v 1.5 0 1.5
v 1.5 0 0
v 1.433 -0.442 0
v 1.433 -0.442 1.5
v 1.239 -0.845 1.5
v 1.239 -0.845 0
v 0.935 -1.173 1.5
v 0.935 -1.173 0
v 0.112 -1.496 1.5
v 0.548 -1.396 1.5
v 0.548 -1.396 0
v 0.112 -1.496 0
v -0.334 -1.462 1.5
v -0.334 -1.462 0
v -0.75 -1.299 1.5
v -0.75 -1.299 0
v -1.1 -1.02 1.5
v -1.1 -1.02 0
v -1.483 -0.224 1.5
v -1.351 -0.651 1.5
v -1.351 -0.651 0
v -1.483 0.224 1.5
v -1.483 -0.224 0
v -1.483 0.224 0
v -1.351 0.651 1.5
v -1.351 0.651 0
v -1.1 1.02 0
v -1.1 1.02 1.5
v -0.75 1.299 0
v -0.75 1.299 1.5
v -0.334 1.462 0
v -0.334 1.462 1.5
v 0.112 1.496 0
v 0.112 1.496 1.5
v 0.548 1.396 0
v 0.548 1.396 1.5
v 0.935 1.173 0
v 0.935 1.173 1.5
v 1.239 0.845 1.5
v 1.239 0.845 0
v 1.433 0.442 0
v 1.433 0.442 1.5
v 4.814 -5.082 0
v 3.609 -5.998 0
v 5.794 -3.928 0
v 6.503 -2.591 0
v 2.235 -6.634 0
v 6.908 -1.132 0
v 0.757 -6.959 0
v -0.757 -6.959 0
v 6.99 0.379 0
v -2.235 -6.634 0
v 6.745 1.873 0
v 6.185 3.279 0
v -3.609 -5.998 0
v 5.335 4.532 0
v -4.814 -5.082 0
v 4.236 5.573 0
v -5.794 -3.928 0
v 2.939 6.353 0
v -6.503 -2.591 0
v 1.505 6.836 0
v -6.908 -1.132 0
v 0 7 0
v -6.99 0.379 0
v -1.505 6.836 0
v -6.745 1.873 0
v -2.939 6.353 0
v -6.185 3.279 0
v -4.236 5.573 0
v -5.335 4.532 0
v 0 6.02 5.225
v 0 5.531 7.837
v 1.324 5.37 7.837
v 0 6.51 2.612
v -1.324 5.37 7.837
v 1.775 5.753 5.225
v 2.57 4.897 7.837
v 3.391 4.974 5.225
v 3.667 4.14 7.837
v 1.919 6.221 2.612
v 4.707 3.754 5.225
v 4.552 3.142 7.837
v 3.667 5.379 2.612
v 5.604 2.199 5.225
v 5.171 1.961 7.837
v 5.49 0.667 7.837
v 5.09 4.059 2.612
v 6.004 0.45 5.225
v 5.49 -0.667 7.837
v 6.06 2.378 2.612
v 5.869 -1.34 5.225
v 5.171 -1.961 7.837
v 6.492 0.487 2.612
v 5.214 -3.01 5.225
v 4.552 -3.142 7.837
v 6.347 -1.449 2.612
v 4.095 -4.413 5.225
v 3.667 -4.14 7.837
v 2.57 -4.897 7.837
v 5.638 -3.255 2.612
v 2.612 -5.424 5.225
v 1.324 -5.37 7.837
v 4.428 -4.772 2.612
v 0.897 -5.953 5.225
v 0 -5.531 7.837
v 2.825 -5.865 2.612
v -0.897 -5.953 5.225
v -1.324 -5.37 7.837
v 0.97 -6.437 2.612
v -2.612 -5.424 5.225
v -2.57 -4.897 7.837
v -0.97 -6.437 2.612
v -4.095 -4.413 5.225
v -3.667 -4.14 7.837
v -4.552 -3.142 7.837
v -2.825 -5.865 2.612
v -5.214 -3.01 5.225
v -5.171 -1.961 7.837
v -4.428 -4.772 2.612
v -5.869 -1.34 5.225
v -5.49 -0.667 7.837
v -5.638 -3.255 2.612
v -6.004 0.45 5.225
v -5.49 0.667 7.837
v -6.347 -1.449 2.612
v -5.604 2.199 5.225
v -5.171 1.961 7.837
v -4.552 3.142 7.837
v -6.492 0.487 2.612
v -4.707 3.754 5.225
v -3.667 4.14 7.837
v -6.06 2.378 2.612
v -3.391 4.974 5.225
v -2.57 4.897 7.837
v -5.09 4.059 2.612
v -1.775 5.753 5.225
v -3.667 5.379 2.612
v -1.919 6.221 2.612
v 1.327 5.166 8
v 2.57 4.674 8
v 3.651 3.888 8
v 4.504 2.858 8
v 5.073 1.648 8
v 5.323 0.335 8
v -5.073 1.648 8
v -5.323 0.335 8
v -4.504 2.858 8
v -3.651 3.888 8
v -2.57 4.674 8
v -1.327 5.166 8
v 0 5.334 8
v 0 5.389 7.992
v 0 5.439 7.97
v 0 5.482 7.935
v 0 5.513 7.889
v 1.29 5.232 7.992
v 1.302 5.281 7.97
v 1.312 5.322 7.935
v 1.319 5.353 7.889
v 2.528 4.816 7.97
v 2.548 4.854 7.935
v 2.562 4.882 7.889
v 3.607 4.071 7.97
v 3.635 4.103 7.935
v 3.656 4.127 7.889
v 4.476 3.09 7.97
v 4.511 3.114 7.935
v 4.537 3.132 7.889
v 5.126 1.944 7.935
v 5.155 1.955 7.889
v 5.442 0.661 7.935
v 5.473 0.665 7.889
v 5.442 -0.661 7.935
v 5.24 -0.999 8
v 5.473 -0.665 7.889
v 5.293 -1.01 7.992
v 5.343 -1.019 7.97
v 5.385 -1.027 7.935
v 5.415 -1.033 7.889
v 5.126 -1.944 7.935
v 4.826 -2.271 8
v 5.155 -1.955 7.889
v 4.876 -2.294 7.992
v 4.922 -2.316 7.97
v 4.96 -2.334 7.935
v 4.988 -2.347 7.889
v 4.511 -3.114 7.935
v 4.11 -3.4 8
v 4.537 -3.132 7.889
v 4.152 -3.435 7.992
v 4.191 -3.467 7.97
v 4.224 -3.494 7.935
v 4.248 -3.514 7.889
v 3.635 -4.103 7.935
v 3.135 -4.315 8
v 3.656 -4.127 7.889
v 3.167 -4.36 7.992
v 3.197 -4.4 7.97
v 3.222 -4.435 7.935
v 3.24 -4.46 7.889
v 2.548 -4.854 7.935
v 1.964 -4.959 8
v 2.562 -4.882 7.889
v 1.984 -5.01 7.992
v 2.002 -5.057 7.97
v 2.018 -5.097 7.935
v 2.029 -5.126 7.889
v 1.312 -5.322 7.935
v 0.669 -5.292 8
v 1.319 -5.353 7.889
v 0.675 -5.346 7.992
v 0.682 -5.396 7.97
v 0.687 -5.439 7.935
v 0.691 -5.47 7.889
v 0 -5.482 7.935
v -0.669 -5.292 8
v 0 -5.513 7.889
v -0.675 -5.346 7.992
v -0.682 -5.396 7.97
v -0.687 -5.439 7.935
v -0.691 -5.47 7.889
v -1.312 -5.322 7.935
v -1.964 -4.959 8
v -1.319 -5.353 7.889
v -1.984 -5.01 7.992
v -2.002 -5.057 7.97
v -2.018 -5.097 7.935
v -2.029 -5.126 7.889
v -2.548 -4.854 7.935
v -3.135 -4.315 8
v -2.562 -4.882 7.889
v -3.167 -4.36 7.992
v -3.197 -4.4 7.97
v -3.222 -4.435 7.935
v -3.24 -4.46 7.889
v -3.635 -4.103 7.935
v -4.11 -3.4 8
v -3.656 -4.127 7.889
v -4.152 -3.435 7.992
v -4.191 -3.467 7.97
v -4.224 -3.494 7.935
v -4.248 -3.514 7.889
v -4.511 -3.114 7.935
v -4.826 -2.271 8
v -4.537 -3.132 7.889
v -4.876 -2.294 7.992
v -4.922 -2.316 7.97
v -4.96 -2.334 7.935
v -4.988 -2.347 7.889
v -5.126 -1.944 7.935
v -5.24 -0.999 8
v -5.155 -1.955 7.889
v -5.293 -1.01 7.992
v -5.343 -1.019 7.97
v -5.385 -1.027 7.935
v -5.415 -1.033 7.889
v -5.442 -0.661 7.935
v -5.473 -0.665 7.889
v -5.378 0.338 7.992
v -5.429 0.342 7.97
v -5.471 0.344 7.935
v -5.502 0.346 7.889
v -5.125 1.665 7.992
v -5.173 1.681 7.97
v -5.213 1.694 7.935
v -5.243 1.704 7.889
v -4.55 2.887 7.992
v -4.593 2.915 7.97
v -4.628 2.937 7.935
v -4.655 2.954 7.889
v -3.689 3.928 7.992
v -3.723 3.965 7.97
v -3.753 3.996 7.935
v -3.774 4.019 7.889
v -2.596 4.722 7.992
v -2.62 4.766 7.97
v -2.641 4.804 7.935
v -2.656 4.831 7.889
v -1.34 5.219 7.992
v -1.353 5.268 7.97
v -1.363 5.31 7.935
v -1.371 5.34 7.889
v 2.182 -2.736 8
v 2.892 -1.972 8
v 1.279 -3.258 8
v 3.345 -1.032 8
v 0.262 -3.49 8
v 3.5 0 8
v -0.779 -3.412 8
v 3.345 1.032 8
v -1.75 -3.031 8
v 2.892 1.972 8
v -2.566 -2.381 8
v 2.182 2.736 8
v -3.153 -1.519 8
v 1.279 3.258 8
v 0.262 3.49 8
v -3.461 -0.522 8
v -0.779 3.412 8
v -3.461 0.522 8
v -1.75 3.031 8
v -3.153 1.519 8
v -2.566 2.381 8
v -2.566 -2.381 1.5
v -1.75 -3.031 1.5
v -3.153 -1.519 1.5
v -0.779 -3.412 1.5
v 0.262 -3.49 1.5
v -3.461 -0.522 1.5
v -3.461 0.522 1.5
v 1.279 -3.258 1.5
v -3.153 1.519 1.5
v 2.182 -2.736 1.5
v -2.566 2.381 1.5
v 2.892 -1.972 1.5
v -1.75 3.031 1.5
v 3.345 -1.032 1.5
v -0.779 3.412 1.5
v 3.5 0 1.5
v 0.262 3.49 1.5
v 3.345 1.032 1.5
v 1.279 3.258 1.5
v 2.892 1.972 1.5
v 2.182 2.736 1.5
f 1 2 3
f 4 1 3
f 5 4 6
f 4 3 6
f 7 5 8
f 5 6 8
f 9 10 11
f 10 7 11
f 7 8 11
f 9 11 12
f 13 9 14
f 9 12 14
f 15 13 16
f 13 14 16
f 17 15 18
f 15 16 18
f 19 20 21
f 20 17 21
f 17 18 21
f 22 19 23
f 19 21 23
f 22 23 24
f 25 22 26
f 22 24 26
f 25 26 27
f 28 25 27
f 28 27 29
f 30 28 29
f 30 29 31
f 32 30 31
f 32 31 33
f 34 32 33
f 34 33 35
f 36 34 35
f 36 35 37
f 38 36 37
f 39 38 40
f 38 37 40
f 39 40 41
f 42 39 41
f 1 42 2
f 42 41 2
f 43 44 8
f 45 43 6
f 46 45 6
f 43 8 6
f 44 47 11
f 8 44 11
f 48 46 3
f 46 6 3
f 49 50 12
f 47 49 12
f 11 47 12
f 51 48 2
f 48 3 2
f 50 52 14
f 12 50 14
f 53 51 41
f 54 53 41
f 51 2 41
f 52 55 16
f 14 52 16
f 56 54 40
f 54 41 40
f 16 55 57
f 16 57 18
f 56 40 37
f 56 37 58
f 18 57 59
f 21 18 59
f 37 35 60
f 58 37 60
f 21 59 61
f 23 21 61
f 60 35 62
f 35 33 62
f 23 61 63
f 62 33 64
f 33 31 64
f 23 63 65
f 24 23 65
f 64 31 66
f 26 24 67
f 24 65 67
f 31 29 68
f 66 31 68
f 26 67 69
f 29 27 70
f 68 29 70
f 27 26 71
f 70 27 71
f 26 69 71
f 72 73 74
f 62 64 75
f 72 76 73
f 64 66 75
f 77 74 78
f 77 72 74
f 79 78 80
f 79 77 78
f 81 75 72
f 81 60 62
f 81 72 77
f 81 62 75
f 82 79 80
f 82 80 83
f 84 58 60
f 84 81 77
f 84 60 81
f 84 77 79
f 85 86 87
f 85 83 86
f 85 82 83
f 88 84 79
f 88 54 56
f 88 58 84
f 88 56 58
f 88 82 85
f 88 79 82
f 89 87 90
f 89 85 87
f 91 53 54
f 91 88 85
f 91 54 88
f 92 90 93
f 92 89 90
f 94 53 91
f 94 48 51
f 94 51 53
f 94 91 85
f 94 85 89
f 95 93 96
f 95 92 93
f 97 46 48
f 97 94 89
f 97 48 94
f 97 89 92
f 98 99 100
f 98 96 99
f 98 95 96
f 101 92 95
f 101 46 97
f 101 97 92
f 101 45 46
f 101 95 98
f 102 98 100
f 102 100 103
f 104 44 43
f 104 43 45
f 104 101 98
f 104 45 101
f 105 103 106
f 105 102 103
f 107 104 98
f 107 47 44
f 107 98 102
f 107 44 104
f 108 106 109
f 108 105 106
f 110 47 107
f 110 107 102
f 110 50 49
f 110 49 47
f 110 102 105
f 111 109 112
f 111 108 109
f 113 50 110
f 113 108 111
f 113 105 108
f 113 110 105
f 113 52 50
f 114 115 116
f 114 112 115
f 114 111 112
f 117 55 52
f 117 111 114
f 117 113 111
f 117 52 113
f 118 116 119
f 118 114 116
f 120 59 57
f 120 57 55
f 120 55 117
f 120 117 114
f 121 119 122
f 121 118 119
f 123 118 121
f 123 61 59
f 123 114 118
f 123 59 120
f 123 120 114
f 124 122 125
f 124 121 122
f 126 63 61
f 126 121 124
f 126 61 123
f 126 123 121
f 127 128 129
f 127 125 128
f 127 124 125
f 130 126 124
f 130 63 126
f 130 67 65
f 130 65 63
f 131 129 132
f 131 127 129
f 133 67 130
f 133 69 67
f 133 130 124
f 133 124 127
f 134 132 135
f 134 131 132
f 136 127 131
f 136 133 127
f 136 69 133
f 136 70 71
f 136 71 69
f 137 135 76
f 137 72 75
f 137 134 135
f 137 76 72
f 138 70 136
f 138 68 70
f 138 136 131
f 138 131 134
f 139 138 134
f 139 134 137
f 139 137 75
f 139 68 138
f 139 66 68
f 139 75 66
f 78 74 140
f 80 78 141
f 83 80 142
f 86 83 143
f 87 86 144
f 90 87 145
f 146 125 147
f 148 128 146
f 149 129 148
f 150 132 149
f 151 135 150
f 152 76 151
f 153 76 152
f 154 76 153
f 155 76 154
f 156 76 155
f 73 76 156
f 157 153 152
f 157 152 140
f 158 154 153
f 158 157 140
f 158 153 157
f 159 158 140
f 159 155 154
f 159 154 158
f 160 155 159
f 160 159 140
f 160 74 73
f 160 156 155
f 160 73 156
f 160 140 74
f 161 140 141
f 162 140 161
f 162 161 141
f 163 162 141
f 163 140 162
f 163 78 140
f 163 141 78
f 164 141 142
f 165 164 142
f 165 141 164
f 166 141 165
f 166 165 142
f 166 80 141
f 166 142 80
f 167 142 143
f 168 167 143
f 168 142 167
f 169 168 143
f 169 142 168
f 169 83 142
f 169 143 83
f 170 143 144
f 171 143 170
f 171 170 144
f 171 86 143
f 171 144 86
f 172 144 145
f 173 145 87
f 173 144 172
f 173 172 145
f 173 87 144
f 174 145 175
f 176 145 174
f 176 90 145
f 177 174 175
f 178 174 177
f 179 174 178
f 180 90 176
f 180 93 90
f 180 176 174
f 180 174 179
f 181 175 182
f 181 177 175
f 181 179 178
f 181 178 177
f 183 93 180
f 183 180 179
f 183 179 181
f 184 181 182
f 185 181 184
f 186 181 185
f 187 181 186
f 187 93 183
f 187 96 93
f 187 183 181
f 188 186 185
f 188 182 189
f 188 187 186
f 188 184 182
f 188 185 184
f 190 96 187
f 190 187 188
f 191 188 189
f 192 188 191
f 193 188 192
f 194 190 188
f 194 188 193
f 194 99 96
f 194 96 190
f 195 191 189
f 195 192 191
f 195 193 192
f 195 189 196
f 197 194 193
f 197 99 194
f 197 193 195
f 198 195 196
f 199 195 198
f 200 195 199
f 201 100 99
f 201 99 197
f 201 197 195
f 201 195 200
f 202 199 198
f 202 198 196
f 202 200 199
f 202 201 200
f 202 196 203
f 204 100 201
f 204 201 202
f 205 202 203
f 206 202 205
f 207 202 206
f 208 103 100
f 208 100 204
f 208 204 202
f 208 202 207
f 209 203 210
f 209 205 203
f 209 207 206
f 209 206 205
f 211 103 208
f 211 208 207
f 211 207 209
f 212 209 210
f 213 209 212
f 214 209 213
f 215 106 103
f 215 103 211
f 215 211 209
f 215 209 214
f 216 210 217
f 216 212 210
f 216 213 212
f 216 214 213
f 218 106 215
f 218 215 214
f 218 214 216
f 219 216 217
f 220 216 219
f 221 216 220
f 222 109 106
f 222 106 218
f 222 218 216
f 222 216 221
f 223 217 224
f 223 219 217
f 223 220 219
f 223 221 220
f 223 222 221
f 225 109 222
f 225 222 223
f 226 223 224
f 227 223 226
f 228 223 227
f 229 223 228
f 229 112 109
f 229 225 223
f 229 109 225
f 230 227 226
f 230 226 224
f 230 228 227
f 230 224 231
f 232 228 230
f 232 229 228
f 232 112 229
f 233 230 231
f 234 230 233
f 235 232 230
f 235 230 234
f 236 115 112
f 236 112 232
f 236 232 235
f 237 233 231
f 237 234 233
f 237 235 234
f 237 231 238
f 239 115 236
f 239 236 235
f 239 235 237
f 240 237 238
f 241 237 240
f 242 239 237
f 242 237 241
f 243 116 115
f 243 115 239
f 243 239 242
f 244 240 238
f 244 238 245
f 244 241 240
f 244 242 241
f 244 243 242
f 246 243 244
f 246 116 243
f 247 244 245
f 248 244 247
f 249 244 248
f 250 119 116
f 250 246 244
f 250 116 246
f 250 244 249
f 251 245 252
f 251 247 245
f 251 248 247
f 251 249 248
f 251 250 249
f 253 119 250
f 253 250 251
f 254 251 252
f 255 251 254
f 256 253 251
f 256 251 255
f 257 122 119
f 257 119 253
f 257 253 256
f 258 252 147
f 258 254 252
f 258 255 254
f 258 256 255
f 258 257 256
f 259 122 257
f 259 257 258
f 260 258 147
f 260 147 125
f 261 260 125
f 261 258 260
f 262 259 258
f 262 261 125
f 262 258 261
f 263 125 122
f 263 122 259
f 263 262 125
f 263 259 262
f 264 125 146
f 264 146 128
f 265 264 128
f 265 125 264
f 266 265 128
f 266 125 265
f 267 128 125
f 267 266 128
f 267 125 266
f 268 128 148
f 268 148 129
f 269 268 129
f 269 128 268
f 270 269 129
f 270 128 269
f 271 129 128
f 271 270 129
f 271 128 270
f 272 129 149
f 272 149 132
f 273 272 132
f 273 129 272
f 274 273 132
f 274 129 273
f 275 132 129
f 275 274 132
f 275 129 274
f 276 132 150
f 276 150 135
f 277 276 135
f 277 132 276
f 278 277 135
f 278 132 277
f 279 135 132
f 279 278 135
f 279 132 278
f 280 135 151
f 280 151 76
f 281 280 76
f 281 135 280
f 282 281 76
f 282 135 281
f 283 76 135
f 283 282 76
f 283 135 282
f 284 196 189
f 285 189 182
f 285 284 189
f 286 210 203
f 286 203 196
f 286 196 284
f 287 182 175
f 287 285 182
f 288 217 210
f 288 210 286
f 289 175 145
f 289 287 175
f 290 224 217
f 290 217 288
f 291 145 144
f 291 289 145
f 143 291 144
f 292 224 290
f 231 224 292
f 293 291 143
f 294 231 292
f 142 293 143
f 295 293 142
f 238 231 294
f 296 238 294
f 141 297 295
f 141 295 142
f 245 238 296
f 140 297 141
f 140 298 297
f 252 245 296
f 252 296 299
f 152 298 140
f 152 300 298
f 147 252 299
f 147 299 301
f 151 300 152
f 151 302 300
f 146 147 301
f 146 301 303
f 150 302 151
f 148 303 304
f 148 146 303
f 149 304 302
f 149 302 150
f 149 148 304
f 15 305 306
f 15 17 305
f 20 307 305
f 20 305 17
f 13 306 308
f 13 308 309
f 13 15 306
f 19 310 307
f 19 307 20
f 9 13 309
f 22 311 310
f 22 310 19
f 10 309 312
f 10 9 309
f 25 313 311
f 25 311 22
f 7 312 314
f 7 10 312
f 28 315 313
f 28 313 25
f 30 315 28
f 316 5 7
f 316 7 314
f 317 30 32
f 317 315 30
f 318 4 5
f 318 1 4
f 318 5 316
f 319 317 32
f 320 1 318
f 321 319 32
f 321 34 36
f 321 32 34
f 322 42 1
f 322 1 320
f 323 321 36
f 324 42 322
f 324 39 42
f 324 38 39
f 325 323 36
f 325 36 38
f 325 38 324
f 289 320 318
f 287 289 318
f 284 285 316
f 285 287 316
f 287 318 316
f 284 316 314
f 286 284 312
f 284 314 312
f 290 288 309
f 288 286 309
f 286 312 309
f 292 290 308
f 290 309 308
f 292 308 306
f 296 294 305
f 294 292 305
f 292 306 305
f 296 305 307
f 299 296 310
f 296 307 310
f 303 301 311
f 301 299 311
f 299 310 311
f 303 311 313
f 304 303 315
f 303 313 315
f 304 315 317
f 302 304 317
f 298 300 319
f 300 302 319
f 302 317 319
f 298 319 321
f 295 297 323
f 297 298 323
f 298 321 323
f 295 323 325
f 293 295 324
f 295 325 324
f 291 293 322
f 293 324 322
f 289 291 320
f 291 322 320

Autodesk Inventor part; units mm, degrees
ref_plane "YZ Plane" through (0, 0, 0) normal (1, 0, 0) x (0, 1, 0)
ref_plane "XZ Plane" through (0, 0, 0) normal (0, 1, 0) x (-1, 0, 0)
ref_plane "XY Plane" through (0, 0, 0) normal (0, 0, 1) x (1, 0, 0)
sketch "Sketch1" plane through (0, 0, 0) normal (0, 0, 1) x (1, 0, 0)
  circle A0 centre (0, 0) radius 3.5
  circle A1 centre (0, 0) radius 1.5
  circle A2 centre (0, 0) radius 3.05
  dimension "D" = 7
  dimension "M3" = 3
  dimension "d12" = 6.1
extrude "Extrusion1" add sketch "Sketch1" along normal blind 8 contours A0 | A2
sketch "Sketch3" plane through (0, 0, 0) normal (1, 0, 0) x (0, 1, 0)
  line L0 (3.5, 8) -> (3.5, 0) projected
  line L1 (3.5, 0) -> (1.5, 0) projected
  line L2 (1.5, 0) -> (1.5, 8) projected
  line L3 (1.5, 8) -> (3.5, 8) projected
  line L4 (-3.5, 0) -> (-3.5, 8) projected
  line L5 (-3.5, 8) -> (-1.5, 8) projected
  line L6 (-1.5, 8) -> (-1.5, 0) projected
  line L7 (-1.5, 0) -> (-3.5, 0) projected
  line L8 (5.6436, 0) -> (3.5, 0)
  line L9 (0, -1.6) -> (0, 9.6) projected
  line L10 (3.5, 8) -> (5.5, 8)
  line L11 (5.5, 8) -> (7, 0)
  line L12 (7, 0) -> (3.5, 0)
  point P0 (0, 0)
  dimension "d15" = 2
  dimension "d18" = 7
revolve "Revolution2" add sketch "Sketch3" angle 360 about axis through (0, 0, -10) along (0, 0, 1) contours L10 L11 L12 L8 L0
extrude "Extrusion3" cut sketch "Sketch1" along normal up to surface (8 mm away) contours A0 | A2
fillet "Fillet1" radius 0.2 1 edges at (0, -5.5, 8)
extrude "Extrusion4" add sketch "Sketch1" along normal blind 1.5 contours A0 | A2
properties part number "Amortecedor_Borracha" material "Rubber"
